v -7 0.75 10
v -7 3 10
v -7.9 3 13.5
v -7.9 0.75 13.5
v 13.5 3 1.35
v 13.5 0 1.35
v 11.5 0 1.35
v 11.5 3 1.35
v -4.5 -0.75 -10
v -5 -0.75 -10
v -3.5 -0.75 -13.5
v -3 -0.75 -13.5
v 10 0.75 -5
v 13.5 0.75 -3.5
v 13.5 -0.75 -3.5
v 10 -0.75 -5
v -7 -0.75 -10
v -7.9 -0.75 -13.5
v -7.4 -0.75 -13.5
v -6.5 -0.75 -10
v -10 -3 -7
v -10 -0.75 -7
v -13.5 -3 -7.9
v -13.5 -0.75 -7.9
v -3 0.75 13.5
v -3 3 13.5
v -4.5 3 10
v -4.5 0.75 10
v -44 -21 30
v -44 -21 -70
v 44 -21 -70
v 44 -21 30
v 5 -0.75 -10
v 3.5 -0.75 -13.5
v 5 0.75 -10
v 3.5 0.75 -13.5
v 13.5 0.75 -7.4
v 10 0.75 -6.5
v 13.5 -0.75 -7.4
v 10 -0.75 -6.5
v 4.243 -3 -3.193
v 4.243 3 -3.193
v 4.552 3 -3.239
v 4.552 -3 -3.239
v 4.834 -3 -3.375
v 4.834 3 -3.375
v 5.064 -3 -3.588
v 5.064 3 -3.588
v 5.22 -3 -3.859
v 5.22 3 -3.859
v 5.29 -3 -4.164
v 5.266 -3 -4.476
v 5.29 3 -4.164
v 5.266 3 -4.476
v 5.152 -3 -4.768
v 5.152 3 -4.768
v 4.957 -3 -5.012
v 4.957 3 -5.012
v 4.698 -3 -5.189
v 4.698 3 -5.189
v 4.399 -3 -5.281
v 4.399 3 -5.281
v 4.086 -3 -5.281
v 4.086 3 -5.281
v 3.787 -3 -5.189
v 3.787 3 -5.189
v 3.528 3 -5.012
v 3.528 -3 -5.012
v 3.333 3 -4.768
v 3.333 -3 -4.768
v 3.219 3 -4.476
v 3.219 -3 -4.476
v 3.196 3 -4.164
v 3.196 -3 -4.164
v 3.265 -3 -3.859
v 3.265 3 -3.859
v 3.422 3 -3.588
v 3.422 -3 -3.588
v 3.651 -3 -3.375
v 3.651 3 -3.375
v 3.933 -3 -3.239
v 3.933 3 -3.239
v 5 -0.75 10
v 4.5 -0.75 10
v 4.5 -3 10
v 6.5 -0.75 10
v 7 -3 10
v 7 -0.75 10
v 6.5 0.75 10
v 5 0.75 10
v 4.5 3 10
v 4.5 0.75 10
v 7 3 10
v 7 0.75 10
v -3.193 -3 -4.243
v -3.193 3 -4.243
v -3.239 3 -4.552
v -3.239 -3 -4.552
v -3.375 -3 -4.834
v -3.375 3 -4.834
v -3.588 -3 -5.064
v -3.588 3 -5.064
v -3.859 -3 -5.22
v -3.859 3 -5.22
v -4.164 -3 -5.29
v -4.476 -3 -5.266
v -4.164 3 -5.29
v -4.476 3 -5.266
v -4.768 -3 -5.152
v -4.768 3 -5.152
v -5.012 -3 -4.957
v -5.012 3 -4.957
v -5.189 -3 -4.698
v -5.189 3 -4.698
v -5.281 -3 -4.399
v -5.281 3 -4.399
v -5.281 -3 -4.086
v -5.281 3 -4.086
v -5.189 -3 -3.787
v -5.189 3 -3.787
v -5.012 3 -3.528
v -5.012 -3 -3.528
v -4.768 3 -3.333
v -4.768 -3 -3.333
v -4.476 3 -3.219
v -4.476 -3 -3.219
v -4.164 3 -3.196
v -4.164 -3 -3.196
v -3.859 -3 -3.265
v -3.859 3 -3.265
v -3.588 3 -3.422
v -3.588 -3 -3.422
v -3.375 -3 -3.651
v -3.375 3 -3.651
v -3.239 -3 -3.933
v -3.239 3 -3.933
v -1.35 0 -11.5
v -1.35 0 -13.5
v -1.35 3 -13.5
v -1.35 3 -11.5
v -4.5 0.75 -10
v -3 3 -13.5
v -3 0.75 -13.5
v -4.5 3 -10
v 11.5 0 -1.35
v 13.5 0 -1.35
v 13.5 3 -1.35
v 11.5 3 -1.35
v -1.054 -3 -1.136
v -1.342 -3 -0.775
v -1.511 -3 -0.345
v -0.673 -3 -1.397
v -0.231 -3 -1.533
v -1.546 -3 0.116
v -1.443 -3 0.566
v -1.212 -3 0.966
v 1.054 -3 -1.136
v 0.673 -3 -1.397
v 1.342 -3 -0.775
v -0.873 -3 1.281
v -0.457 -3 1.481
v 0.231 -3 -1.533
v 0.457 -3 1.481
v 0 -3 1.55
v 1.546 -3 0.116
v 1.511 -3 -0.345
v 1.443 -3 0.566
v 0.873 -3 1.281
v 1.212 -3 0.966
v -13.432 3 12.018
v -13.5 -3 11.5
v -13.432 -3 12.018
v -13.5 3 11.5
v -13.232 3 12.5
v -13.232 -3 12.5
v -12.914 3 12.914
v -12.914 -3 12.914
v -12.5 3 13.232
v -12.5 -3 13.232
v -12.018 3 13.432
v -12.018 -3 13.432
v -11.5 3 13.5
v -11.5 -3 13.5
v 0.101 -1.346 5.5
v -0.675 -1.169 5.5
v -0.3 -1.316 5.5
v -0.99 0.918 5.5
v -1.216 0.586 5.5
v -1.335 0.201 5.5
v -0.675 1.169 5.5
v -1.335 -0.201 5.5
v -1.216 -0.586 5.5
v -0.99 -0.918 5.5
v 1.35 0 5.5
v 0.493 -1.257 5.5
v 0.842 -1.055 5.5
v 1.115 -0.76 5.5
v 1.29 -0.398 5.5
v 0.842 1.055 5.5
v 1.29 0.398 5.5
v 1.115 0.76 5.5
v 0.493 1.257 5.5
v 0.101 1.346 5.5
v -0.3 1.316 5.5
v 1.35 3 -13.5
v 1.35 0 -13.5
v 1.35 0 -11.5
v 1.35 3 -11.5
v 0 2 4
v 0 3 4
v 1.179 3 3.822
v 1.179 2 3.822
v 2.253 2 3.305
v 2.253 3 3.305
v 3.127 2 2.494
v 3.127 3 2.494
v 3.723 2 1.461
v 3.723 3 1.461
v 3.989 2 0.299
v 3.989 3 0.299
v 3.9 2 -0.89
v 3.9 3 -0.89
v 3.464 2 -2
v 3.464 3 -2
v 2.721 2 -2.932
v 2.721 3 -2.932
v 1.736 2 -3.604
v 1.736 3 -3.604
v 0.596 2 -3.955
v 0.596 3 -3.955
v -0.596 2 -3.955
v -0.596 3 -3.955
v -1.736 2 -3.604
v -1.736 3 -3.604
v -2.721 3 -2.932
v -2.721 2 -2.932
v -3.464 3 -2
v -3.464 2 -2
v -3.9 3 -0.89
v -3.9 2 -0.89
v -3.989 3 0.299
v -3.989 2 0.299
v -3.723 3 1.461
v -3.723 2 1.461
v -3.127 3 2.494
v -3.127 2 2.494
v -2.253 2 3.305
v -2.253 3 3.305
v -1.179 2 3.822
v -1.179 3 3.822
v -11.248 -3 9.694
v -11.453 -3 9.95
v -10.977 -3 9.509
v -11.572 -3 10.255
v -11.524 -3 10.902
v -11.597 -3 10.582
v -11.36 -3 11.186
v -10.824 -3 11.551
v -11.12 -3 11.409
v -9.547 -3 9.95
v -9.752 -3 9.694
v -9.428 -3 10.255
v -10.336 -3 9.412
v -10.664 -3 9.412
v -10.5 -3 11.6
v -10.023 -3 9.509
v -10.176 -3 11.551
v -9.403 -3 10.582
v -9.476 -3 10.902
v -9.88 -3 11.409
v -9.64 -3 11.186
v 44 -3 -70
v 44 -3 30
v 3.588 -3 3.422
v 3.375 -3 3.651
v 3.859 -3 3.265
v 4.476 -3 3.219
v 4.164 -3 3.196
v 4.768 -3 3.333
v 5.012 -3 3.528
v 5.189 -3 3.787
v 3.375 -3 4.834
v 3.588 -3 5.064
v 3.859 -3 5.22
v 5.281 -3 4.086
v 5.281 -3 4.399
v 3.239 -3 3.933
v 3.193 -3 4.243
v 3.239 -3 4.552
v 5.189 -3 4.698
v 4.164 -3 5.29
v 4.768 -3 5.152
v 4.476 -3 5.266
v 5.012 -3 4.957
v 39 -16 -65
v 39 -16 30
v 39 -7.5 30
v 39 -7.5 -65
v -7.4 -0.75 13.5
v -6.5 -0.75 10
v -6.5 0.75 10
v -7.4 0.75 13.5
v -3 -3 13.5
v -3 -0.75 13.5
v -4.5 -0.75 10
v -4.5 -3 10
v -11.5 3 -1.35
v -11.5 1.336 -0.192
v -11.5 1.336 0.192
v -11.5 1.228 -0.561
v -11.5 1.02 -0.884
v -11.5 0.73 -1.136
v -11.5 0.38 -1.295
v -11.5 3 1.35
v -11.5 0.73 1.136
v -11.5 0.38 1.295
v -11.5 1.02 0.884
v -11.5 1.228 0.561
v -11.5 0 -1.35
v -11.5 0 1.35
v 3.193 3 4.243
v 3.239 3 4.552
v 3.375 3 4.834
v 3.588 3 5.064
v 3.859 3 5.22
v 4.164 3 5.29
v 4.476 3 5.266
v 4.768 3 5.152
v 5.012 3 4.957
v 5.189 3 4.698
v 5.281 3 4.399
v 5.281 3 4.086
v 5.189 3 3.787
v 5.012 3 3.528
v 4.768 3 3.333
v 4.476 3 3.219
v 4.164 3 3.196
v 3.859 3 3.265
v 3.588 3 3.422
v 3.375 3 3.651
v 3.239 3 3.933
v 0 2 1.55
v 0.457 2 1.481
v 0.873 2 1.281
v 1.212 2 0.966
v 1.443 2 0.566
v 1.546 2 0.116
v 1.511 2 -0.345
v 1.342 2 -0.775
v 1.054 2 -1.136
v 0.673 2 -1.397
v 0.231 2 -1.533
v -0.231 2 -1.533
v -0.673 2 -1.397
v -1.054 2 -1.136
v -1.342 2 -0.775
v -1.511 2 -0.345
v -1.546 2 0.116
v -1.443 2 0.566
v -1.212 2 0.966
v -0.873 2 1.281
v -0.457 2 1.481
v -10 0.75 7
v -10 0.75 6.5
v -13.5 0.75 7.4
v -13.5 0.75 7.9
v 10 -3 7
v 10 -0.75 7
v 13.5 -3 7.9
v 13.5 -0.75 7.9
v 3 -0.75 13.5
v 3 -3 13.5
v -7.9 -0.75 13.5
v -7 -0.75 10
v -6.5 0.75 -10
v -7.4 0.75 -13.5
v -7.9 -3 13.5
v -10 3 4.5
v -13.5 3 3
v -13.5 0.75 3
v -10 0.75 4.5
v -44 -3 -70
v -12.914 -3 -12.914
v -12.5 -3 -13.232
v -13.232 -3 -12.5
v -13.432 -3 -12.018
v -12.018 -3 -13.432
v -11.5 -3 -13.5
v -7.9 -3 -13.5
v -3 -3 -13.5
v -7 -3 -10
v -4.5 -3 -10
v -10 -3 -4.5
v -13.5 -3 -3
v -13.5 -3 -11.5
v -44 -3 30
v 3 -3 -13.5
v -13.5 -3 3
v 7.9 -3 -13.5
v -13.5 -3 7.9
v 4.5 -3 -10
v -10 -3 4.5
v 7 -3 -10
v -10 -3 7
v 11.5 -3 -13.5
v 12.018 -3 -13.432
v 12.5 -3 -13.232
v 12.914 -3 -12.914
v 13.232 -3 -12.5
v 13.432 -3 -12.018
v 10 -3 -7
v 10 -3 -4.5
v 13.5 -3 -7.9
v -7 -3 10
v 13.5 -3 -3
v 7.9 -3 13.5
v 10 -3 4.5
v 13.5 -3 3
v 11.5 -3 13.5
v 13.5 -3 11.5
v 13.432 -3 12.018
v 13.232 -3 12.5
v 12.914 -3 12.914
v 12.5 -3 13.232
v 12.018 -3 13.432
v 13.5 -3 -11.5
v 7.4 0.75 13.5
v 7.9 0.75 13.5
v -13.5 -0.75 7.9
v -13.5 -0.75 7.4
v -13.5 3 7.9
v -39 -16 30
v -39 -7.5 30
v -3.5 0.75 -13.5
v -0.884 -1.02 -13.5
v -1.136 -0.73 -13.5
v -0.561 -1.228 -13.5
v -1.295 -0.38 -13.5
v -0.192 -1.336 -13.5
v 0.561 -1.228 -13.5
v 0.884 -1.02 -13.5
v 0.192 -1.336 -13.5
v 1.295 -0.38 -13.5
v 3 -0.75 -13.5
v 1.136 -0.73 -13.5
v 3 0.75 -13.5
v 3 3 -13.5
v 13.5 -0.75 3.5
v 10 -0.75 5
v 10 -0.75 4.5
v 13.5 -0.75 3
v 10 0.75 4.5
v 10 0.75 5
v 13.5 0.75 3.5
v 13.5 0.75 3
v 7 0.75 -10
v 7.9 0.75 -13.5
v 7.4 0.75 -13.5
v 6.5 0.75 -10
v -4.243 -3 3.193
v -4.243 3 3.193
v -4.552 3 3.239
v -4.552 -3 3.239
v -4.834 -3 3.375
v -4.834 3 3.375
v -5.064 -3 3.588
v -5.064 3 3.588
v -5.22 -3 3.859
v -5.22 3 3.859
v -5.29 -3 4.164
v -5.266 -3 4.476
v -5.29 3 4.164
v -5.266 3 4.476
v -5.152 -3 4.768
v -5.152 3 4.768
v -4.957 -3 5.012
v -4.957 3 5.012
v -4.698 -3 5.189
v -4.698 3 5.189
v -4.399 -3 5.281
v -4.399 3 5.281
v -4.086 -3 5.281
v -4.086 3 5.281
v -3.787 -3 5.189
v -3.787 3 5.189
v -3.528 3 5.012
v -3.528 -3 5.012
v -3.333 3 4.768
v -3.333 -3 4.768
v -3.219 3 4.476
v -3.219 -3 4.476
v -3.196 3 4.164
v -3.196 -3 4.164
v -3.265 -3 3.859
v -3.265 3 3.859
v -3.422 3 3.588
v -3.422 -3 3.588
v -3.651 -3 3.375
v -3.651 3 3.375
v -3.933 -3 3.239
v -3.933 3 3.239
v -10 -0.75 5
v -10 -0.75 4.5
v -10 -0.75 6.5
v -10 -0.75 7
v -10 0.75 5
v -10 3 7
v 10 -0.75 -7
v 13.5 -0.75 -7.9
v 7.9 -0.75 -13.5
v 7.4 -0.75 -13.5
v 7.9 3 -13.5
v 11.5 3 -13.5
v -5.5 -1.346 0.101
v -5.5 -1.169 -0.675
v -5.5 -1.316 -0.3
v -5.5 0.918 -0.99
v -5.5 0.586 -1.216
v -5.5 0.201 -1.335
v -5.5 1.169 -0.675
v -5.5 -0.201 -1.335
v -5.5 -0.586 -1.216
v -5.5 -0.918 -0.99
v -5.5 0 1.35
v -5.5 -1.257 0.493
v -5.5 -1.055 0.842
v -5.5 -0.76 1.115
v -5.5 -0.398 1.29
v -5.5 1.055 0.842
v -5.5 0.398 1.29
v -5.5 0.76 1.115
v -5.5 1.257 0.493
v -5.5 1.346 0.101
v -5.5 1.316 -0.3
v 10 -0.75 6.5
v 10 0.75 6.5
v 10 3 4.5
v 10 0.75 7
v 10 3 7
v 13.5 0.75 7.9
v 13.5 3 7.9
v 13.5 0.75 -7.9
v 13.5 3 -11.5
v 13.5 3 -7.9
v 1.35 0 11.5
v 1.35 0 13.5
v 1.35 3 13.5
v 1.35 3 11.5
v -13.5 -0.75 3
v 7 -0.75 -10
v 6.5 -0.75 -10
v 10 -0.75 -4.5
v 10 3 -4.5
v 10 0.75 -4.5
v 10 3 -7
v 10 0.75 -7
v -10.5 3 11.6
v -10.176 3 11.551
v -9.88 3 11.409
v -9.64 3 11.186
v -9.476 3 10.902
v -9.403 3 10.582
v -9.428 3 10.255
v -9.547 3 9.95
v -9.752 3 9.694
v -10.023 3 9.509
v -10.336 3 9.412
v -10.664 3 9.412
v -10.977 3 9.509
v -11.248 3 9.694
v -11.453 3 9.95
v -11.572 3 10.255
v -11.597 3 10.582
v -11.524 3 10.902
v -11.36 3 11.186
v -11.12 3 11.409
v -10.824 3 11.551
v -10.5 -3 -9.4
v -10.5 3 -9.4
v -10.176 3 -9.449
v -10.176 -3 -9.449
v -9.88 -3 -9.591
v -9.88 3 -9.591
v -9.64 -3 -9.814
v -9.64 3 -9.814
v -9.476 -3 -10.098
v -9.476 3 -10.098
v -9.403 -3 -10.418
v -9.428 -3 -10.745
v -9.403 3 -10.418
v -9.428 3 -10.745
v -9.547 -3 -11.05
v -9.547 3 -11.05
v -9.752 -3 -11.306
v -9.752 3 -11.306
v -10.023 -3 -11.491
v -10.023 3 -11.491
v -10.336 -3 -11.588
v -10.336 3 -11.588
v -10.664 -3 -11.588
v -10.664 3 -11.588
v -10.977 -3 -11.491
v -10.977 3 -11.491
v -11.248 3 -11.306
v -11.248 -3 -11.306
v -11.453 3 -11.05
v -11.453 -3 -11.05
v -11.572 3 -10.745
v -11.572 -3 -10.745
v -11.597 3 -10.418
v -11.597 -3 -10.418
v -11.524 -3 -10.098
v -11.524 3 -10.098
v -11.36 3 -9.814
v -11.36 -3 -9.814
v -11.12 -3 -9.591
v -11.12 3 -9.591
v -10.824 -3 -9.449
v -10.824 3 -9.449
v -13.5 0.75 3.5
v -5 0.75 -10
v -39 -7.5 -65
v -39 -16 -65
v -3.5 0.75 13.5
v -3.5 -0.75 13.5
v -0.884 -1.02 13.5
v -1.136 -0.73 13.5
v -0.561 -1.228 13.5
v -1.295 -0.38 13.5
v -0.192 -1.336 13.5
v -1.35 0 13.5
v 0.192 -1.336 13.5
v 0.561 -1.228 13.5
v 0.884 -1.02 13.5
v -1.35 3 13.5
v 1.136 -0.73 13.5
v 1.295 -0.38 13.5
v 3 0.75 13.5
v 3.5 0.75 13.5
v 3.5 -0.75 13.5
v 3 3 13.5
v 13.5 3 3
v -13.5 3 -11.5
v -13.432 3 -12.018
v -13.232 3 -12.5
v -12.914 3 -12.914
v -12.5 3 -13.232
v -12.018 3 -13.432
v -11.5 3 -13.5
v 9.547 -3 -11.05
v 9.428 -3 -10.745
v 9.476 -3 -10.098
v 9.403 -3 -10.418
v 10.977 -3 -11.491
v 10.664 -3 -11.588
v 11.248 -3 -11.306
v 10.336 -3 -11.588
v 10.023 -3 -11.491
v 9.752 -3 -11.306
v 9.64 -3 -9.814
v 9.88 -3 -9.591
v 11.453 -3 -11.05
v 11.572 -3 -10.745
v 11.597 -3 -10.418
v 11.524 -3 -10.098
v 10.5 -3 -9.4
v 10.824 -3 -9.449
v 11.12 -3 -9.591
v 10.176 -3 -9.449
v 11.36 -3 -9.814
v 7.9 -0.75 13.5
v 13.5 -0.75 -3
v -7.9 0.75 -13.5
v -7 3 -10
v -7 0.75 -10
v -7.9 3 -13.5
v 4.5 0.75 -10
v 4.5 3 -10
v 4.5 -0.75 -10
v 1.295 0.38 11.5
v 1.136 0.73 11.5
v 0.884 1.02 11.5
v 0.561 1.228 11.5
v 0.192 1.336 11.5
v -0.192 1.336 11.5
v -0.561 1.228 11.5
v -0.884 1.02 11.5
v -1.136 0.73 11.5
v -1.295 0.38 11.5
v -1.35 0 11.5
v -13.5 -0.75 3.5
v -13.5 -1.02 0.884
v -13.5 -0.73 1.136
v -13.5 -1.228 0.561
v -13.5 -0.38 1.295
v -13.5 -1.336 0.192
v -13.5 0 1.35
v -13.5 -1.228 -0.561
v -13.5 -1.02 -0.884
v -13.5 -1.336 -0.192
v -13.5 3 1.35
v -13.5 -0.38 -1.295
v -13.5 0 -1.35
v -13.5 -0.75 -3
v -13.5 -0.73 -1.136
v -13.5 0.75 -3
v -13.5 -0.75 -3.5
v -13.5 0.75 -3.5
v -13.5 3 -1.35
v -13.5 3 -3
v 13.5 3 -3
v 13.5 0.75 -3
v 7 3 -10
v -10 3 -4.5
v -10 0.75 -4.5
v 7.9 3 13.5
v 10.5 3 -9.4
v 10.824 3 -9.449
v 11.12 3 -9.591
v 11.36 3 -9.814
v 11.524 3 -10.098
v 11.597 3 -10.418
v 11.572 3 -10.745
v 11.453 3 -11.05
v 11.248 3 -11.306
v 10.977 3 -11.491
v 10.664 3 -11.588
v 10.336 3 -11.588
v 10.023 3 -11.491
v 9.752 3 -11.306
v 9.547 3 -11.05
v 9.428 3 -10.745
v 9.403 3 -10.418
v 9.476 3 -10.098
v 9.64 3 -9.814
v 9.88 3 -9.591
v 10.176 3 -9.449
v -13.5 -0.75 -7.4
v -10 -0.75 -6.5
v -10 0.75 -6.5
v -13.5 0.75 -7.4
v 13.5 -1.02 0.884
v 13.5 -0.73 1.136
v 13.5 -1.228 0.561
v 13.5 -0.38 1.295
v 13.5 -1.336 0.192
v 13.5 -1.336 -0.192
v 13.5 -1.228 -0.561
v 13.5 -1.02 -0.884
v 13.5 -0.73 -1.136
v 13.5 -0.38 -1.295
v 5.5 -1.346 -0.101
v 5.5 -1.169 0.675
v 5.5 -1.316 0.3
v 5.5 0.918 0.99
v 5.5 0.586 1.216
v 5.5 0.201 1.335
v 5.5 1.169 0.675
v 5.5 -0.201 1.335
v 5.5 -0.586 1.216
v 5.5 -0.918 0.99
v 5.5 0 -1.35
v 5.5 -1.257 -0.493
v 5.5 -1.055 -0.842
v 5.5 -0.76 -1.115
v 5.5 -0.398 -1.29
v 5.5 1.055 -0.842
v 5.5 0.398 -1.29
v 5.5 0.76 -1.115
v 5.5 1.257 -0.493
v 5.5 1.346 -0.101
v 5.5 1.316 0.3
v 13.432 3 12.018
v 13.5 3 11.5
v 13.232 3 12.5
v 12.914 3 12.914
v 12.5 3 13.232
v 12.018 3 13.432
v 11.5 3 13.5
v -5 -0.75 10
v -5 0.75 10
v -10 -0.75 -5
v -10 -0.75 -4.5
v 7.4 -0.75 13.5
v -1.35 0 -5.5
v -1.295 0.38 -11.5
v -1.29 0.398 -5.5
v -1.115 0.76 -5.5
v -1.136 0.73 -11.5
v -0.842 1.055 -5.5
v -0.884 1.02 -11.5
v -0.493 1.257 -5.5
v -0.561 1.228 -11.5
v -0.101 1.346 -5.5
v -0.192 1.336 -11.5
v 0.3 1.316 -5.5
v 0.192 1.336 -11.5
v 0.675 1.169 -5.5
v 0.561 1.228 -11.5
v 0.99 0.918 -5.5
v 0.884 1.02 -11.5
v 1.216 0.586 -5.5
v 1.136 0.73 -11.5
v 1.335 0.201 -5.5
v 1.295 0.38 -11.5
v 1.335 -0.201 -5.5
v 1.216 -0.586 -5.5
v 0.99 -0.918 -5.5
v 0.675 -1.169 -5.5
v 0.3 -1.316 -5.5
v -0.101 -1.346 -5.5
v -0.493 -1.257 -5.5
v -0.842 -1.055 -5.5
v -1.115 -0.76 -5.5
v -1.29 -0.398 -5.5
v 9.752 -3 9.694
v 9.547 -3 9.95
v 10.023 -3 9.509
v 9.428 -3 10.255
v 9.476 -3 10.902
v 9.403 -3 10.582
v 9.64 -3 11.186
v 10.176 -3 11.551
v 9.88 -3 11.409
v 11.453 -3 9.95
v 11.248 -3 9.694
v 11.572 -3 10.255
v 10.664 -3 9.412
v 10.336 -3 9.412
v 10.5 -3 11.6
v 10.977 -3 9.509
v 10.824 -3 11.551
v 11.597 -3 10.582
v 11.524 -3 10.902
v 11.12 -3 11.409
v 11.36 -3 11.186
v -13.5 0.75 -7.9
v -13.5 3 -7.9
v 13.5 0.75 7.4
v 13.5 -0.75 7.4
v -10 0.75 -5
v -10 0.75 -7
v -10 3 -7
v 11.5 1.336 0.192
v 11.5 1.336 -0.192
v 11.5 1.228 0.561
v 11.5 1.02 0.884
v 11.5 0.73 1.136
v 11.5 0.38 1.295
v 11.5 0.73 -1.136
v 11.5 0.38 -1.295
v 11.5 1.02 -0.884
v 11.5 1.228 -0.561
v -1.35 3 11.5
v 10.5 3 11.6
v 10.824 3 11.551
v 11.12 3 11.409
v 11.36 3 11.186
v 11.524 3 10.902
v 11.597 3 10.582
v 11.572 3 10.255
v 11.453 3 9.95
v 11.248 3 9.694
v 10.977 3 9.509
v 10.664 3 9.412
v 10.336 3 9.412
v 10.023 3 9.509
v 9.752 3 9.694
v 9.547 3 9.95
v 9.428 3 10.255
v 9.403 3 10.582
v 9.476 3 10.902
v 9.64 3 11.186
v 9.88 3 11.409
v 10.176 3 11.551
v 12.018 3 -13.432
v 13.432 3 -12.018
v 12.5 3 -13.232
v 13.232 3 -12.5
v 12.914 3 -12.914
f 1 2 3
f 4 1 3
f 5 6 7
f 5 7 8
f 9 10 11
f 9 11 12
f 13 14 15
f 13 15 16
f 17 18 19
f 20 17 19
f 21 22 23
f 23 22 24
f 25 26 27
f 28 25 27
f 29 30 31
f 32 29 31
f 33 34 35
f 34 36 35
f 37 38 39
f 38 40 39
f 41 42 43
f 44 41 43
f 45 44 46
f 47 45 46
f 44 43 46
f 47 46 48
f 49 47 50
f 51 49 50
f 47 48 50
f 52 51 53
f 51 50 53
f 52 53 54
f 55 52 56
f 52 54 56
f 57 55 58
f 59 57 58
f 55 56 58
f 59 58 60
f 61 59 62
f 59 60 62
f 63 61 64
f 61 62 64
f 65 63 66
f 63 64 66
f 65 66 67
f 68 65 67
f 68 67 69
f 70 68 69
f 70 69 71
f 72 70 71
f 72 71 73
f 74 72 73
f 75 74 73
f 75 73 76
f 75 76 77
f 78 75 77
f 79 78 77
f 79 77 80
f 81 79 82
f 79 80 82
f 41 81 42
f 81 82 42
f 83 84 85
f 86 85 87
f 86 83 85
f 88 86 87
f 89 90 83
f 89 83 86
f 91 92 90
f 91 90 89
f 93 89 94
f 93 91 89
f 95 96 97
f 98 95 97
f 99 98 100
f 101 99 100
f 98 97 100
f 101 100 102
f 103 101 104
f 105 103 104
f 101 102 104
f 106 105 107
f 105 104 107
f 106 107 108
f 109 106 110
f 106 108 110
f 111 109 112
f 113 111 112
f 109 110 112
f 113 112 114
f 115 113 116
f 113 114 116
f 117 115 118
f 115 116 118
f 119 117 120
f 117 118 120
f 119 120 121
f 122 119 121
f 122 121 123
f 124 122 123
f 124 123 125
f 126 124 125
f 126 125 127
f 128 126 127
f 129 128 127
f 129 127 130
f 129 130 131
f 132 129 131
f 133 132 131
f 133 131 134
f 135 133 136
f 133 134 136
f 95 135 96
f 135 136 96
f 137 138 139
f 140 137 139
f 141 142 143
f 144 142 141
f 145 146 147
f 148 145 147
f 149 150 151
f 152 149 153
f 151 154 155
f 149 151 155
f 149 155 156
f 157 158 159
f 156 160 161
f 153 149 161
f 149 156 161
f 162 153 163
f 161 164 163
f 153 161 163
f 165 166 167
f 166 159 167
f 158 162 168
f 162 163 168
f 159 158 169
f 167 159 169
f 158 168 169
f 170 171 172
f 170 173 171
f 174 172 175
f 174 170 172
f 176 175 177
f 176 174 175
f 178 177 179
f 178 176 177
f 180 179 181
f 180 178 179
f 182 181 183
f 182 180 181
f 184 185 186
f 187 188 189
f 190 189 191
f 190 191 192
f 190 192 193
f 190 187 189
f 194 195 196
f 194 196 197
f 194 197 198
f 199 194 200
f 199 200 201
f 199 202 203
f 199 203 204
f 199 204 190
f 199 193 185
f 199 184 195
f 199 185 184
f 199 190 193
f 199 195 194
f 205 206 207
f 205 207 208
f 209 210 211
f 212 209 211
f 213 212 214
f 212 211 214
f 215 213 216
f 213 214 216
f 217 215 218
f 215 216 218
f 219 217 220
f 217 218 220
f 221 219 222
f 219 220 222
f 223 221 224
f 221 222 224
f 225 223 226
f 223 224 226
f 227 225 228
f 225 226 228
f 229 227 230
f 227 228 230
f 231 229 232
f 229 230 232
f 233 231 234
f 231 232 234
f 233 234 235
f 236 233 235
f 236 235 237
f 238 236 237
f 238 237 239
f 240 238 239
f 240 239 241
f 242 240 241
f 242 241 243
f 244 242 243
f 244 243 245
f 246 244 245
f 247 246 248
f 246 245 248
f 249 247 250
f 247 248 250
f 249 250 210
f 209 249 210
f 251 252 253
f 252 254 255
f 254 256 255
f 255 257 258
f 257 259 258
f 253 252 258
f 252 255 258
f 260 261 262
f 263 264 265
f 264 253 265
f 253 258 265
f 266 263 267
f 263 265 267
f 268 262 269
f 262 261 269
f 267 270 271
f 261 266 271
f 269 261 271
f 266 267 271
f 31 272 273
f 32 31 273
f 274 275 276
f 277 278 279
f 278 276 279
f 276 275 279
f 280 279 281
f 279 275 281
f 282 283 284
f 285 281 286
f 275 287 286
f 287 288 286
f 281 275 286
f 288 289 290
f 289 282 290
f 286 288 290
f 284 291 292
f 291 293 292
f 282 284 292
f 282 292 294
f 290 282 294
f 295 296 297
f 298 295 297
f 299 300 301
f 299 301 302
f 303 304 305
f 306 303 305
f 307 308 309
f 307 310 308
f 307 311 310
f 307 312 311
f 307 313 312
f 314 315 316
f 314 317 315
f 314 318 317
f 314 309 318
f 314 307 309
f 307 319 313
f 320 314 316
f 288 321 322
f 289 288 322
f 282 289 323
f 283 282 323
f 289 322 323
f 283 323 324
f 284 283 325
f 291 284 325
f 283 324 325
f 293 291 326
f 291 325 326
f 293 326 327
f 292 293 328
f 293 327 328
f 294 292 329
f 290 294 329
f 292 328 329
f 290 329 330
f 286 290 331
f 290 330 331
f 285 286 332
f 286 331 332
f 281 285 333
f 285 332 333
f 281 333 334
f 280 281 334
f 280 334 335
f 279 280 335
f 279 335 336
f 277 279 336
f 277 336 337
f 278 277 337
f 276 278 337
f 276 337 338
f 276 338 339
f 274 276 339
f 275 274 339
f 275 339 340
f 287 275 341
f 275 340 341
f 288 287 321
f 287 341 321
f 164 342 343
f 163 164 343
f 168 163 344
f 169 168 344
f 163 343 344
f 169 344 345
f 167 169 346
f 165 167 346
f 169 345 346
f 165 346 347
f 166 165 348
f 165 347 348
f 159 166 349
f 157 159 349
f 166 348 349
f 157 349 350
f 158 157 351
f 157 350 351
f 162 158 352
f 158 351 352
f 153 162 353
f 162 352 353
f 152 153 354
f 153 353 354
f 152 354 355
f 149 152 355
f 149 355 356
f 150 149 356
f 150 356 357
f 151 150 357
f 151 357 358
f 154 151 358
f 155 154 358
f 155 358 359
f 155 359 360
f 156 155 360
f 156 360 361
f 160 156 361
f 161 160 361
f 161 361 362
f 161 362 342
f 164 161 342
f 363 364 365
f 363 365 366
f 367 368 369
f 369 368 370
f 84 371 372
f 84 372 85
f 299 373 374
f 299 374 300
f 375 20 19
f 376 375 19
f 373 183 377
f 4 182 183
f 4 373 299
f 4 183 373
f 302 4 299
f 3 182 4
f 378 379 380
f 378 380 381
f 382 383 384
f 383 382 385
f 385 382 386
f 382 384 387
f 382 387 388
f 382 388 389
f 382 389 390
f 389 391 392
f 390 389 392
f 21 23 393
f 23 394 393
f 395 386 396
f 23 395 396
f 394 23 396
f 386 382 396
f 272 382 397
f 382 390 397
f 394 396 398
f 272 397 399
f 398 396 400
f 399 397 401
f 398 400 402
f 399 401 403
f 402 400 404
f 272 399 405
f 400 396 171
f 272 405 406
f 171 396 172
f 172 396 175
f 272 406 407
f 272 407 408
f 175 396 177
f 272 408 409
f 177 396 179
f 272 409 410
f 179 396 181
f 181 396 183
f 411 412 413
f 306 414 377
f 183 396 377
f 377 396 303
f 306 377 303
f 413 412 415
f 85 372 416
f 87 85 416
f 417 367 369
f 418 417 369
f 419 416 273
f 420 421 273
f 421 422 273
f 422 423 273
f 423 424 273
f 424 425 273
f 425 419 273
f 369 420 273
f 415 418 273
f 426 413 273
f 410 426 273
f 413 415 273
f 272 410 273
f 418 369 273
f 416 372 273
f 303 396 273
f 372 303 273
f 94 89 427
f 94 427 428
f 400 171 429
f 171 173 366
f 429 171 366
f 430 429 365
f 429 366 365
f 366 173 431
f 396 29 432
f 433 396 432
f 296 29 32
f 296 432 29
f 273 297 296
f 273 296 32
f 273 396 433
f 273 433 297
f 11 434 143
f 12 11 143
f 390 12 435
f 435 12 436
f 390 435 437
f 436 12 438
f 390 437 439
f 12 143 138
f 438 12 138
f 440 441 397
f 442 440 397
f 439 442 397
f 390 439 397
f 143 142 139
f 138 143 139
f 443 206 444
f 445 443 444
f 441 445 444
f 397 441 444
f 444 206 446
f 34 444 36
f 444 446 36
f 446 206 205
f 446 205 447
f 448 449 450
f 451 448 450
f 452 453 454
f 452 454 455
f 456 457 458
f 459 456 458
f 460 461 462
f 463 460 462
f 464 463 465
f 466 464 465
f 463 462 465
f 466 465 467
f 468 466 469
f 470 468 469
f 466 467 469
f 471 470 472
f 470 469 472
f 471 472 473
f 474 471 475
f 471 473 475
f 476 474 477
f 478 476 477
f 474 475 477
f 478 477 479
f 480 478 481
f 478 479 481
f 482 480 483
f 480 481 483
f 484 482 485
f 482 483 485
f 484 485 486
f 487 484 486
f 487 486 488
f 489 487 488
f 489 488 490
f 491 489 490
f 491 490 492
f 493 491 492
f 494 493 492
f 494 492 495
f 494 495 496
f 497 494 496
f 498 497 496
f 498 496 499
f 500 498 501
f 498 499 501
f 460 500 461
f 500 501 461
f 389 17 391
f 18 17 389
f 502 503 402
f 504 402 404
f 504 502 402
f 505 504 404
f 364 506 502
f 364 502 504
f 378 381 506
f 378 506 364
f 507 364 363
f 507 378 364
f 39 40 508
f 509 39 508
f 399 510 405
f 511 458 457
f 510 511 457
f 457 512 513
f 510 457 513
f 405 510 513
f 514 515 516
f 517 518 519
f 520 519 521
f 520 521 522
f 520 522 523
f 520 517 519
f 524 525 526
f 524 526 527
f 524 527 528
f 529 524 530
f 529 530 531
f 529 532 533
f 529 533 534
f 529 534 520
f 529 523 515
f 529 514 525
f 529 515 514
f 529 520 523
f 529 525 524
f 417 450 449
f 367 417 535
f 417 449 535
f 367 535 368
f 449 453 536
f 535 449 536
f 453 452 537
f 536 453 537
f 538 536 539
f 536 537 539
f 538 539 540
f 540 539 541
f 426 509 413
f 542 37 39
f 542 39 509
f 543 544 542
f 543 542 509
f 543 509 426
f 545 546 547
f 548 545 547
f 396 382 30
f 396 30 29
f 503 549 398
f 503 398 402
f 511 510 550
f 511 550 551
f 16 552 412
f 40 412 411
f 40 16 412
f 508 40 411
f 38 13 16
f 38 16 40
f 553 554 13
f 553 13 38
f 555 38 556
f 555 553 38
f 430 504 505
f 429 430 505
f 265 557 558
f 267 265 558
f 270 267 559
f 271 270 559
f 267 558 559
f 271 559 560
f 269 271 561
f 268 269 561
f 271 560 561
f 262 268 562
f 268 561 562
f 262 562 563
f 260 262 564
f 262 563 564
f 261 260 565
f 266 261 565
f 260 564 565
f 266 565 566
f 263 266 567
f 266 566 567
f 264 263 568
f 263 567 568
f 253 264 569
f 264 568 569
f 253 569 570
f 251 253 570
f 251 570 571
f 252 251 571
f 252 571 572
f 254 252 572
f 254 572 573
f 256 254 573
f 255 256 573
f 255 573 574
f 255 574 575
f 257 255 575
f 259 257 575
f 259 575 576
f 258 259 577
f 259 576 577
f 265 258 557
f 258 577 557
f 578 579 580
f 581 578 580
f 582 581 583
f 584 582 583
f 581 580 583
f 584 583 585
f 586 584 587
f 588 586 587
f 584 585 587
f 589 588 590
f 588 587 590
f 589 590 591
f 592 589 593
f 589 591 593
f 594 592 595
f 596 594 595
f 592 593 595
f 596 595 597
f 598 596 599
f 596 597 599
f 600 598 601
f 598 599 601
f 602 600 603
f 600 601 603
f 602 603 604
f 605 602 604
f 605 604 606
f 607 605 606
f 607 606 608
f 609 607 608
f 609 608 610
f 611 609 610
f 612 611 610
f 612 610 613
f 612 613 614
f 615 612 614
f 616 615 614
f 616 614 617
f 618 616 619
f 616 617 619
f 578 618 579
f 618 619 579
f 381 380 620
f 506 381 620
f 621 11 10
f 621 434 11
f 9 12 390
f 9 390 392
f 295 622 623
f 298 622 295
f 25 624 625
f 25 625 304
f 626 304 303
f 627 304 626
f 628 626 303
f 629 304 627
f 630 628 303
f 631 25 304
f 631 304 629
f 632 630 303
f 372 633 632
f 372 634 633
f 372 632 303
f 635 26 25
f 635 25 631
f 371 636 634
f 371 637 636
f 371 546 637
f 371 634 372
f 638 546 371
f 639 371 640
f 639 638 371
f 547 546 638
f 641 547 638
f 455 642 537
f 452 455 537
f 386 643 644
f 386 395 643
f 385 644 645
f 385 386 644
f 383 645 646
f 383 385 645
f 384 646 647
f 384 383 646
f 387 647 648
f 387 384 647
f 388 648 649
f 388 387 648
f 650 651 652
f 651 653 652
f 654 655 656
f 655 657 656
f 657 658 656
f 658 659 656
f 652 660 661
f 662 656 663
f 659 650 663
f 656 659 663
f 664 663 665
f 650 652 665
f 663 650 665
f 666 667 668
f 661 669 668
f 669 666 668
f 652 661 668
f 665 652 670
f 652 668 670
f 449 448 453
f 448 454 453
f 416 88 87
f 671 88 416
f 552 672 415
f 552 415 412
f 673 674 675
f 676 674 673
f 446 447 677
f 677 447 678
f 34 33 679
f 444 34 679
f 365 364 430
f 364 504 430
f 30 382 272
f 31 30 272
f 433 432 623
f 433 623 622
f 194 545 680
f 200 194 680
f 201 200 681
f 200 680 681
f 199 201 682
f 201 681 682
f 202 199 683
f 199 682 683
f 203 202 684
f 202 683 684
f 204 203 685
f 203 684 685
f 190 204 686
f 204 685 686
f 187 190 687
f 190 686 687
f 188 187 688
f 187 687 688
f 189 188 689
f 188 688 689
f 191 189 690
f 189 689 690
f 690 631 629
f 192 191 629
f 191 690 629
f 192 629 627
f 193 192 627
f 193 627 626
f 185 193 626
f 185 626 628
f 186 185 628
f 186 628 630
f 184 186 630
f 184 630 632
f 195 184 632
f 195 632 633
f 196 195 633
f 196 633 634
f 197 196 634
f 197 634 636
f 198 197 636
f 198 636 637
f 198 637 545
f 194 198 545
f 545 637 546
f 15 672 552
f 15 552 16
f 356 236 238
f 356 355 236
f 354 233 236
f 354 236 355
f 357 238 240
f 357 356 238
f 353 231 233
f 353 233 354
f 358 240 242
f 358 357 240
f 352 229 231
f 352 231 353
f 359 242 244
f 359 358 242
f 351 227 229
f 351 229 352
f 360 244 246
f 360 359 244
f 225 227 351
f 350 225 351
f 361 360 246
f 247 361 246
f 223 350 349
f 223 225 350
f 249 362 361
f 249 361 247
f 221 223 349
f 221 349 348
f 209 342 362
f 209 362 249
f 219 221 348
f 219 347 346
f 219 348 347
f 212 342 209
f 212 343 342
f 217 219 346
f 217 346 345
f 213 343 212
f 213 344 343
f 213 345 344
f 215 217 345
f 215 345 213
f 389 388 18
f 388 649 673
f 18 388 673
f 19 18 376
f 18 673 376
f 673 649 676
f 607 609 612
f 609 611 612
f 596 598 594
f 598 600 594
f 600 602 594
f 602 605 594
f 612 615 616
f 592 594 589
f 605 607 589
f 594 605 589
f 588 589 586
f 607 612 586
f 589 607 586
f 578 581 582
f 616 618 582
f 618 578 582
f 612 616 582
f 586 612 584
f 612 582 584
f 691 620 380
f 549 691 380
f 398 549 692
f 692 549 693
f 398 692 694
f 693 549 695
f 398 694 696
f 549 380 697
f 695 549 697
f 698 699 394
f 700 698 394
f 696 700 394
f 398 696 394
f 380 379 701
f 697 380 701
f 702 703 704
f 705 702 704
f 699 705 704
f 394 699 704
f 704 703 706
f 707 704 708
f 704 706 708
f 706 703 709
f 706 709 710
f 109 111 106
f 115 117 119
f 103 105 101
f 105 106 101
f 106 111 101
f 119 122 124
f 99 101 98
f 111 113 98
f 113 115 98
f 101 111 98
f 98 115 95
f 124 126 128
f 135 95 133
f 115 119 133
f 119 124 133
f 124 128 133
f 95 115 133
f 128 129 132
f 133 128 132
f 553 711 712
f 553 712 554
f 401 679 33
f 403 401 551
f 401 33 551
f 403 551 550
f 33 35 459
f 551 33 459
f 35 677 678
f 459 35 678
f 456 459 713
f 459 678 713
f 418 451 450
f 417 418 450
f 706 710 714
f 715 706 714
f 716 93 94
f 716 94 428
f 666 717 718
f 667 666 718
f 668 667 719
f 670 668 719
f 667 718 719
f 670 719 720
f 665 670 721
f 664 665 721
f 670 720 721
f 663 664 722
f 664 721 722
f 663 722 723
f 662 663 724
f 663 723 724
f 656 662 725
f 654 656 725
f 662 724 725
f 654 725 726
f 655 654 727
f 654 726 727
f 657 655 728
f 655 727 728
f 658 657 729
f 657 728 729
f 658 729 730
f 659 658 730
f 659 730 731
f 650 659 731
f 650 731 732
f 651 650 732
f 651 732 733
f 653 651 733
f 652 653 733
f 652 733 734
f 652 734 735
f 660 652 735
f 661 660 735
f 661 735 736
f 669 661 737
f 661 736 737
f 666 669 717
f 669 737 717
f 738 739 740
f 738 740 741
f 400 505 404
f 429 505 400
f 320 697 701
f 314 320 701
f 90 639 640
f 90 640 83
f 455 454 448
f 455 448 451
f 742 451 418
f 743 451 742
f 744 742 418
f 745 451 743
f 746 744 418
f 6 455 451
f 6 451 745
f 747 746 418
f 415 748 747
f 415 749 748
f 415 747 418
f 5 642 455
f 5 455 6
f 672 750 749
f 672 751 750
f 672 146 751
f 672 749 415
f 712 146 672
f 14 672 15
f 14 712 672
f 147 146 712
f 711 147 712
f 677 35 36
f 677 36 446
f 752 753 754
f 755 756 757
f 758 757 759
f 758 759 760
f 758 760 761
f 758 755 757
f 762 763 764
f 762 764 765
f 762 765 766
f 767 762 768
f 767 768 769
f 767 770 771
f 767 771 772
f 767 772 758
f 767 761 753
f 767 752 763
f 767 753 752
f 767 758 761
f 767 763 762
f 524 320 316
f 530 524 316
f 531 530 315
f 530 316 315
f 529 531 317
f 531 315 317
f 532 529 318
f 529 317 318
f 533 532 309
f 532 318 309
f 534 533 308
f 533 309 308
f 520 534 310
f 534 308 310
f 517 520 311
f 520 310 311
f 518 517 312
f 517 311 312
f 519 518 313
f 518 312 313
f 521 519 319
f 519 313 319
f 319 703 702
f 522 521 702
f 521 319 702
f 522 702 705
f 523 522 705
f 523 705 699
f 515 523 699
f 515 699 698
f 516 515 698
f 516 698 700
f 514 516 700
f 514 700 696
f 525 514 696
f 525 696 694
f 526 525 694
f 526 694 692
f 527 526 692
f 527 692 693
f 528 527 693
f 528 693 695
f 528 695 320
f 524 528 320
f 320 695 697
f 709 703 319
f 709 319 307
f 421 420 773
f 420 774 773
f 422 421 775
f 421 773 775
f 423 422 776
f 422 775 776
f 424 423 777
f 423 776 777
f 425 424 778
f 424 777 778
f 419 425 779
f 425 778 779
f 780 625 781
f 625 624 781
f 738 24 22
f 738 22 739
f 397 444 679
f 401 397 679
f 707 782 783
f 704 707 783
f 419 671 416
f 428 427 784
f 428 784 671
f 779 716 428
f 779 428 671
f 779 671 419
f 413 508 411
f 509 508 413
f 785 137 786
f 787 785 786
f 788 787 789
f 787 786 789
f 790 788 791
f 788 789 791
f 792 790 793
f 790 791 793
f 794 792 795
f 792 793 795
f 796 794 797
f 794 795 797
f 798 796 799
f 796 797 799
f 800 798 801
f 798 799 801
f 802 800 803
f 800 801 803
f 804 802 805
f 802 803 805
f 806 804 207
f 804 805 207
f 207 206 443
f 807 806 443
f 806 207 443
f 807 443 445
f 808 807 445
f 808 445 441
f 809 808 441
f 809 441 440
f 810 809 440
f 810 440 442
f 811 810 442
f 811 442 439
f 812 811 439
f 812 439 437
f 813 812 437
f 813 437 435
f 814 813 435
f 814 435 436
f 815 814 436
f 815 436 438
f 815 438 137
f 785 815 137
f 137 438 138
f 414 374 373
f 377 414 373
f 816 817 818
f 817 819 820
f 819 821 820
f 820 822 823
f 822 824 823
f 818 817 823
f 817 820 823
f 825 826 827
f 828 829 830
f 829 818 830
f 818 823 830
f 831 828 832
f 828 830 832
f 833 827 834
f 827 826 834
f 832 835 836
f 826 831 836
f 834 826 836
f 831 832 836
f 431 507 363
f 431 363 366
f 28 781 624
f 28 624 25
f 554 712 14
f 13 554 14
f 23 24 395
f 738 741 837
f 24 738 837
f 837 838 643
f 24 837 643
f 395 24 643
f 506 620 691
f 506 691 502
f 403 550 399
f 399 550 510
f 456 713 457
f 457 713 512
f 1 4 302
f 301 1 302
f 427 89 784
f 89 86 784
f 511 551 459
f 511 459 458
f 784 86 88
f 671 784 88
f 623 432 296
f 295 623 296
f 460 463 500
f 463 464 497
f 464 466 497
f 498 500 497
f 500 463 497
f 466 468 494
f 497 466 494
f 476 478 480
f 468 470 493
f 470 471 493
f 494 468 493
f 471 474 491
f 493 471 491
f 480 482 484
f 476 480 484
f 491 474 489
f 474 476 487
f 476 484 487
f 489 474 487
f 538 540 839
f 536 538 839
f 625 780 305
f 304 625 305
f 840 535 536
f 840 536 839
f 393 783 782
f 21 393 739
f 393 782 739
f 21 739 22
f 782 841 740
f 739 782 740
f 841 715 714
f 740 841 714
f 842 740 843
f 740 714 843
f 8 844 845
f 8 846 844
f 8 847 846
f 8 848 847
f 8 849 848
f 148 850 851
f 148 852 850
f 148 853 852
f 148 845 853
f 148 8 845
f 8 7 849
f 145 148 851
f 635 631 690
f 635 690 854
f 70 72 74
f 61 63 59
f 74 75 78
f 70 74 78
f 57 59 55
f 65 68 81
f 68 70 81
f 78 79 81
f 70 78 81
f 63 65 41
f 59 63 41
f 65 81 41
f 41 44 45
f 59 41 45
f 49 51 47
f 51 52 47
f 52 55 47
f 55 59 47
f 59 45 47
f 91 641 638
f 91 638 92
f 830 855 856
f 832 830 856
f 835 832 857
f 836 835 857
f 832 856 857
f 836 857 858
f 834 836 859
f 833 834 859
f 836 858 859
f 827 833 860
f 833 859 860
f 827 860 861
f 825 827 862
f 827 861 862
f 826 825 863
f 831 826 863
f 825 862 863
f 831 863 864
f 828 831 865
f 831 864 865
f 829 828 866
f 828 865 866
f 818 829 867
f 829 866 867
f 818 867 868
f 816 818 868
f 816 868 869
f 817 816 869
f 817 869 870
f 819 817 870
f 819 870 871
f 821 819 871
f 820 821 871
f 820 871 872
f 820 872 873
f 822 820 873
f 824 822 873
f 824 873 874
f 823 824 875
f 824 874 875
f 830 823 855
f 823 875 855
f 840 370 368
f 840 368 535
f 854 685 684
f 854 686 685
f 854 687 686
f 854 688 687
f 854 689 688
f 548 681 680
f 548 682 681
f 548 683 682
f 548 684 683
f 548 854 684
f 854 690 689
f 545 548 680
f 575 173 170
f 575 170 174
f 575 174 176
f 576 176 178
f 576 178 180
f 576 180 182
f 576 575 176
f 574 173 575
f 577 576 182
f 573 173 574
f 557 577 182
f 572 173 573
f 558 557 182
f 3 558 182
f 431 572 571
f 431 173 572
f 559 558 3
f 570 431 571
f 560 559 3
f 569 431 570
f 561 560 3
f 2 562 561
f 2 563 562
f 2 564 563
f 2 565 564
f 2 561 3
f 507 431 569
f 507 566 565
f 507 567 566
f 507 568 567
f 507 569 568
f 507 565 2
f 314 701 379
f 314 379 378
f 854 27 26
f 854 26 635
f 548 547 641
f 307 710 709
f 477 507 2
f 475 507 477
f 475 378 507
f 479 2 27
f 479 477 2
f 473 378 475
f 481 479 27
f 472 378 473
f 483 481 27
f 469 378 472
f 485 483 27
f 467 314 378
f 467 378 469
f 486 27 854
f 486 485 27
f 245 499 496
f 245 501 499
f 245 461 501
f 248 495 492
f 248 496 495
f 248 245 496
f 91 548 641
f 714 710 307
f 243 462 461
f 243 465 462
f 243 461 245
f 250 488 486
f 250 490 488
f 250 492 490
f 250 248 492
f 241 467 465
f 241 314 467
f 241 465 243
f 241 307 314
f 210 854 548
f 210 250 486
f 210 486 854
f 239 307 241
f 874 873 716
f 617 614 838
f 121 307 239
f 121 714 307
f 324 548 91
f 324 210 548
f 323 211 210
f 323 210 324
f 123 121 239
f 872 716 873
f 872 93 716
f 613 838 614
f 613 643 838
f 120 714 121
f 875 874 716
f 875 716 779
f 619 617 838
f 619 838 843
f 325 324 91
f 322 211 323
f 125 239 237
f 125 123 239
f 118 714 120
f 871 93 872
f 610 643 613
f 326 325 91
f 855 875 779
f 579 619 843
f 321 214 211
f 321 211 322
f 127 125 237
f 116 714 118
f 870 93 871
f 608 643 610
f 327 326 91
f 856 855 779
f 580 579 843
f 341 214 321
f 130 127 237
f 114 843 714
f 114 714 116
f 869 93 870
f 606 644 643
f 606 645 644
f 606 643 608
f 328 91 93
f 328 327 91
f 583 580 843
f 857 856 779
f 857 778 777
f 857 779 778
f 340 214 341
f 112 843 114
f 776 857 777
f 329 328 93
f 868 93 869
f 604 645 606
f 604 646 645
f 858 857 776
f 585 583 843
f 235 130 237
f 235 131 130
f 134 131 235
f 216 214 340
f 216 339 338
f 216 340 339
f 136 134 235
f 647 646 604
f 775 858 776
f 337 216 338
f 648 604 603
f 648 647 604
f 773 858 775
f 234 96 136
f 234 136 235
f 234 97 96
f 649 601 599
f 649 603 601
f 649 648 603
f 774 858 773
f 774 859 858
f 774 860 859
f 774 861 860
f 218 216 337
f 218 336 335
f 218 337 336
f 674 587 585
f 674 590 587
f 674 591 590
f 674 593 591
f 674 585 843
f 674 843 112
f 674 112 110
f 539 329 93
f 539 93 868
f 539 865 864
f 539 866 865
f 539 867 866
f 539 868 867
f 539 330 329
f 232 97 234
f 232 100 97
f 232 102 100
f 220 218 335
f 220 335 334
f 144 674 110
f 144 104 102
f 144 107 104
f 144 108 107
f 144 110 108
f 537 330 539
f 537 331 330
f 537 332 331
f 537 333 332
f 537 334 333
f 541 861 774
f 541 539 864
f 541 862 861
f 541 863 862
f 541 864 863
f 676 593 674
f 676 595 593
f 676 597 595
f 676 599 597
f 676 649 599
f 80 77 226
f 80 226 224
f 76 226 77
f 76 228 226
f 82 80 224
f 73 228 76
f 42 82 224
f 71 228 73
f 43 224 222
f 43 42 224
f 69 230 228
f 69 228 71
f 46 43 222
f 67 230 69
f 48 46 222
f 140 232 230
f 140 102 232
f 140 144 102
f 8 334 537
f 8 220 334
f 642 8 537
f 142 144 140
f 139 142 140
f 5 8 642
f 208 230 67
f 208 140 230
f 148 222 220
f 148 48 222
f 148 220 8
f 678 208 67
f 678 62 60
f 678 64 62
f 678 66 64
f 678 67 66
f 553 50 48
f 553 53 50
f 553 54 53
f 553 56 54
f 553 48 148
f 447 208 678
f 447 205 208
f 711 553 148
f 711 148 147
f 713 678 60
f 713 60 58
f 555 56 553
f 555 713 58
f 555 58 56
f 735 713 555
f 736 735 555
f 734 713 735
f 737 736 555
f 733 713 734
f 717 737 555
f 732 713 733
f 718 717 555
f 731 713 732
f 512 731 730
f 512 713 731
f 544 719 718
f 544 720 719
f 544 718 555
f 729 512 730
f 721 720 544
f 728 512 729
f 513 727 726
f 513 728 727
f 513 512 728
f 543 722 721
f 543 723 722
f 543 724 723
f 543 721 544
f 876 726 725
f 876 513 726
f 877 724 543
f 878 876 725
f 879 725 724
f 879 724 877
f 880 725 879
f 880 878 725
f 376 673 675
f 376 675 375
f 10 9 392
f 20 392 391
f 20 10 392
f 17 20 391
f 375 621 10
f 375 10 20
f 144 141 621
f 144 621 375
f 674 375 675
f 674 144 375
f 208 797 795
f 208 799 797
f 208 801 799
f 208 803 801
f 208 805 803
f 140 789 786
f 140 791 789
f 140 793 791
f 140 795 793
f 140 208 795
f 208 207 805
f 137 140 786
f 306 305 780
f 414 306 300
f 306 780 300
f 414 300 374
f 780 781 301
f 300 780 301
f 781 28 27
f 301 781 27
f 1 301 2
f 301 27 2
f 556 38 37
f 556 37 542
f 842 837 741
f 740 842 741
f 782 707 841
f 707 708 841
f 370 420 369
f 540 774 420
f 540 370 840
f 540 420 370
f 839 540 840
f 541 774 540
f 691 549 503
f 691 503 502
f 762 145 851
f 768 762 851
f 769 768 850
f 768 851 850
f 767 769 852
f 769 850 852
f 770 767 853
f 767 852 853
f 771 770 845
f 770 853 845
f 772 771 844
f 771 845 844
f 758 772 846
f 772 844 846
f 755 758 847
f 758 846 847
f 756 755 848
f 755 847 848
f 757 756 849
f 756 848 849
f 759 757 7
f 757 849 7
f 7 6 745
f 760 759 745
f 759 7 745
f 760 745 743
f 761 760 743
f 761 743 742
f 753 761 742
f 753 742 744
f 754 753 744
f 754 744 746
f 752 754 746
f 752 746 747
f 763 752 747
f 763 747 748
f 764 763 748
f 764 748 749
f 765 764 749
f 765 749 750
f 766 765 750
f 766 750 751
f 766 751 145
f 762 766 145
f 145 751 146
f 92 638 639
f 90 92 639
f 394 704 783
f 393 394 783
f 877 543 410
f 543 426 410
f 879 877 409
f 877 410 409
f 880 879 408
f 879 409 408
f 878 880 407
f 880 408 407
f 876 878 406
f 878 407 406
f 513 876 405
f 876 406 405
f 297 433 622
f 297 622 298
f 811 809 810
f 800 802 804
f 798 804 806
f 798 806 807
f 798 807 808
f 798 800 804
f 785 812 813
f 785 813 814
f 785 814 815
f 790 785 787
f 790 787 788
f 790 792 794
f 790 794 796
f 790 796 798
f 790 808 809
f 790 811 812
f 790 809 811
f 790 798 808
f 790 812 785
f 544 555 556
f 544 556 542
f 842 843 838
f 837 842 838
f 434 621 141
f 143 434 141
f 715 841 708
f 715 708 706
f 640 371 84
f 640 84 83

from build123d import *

# Parameters (mm, degrees)
SKETCH_3_W                      = 27
SKETCH_3_H                      = 27
EXTRUDE_1_DEPTH                 = 3
FILLET_1_R                      = 2
SKETCH_4_R                      = 1.1
CUT_EXTRUDE_1_DEPTH             = 6
SKETCH_5_R                      = 1.55
CUT_EXTRUDE_2_DEPTH             = 6
SKETCH_6_R                      = 1.05
CUT_EXTRUDE_3_DEPTH             = 6
PATTERN_CIRCULAR_1_COUNT        = 4
SKETCH_7_R                      = 4
CUT_EXTRUDE_4_DEPTH             = 1
CUT_EXTRUDE_8_DEPTH             = 21.012496096
PATTERN_CIRCULAR_2_COUNT        = 4
PATTERN_CIRCULAR_2_COPY_1_DEPTH = 21.012496096
PATTERN_CIRCULAR_2_COPY_2_DEPTH = 21.012496096
PATTERN_CIRCULAR_2_COPY_3_DEPTH = 21.012496096
SKETCH_12_R                     = 1.35
CUT_EXTRUDE_9_DEPTH             = 8
PATTERN_CIRCULAR_3_COUNT        = 4
EXTRUDE_2_DEPTH                 = 0.75
PATTERN_CIRCULAR_4_COUNT        = 4
PATTERN_CIRCULAR_4_COPY_1_DEPTH = 0.75
PATTERN_CIRCULAR_4_COPY_2_DEPTH = 0.75
PATTERN_CIRCULAR_4_COPY_3_DEPTH = 0.75
SKETCH_22_W                     = 2.7
SKETCH_22_H                     = 3
CUT_EXTRUDE_15_DEPTH            = 2
PATTERN_CIRCULAR_11_COUNT       = 4
SKETCH_31_W                     = 88
SKETCH_31_H                     = 100
EXTRUDE_4_DEPTH                 = 18
SKETCH_32_W                     = 78
SKETCH_32_H                     = 8.5
CUT_EXTRUDE_17_DEPTH            = 95


with BuildPart() as part:
    # ｽｹｯﾁ3 → ﾎﾞｽ - 押し出し1 (new, symmetric)
    with BuildSketch(Plane(origin=(0, 0, 0), x_dir=(1, 0, 0), z_dir=(0, 1, 0))):
        Rectangle(SKETCH_3_W, SKETCH_3_H)
    extrude(amount=EXTRUDE_1_DEPTH, both=True)

    # ﾌｨﾚｯﾄ1
    fillet_1_edges = [part.edges().sort_by_distance(p)[0] for p in [
        (13.5, 0, 13.5),
        (-13.5, 0, 13.5),
        (-13.5, 0, -13.5),
        (13.5, 0, -13.5),
    ]]
    fillet(fillet_1_edges, radius=FILLET_1_R)

    # ｽｹｯﾁ4 → ｶｯﾄ - 押し出し1 (cut)
    with BuildSketch(Plane(origin=(0, 3, 0), x_dir=(1, 0, 0), z_dir=(0, 1, 0))):
        with Locations(Location((-10.5, 10.5, 0), (0, 0, 270))):
            Circle(SKETCH_4_R)
        with Locations(Location((10.5, 10.5, 0), (0, 0, 270))):
            Circle(SKETCH_4_R)
        with Locations(Location((-10.5, -10.5, 0), (0, 0, 270))):
            Circle(SKETCH_4_R)
        with Locations(Location((10.5, -10.5, 0), (0, 0, 270))):
            Circle(SKETCH_4_R)
    extrude(amount=-CUT_EXTRUDE_1_DEPTH, mode=Mode.SUBTRACT)

    # ｽｹｯﾁ5 → ｶｯﾄ - 押し出し2 (cut)
    with BuildSketch(Plane(origin=(0, 3, 0), x_dir=(1, 0, 0), z_dir=(0, 1, 0))):
        with Locations(Location((0, 0, 0), (0, 0, 270))):
            Circle(SKETCH_5_R)
    extrude(amount=-CUT_EXTRUDE_2_DEPTH, mode=Mode.SUBTRACT)

    # ｽｹｯﾁ6 → ｶｯﾄ - 押し出し3 (cut)
    with BuildSketch(Plane(origin=(0, 3, 0), x_dir=(1, 0, 0), z_dir=(0, 1, 0))):
        with Locations(Location((4.242640687, 4.242640687, 0), (0, 0, 270))):
            Circle(SKETCH_6_R)
    cut_extrude_3 = extrude(amount=-CUT_EXTRUDE_3_DEPTH, mode=Mode.SUBTRACT)

    # 円形ﾊﾟﾀｰﾝ1: ｶｯﾄ - 押し出し3 ×4 about axis
    pattern_circular_1_axis = Axis((0, 0, 0), (0, 1, 0))
    for i in range(1, PATTERN_CIRCULAR_1_COUNT):
        add(cut_extrude_3.rotate(pattern_circular_1_axis, i * 360 / PATTERN_CIRCULAR_1_COUNT), mode=Mode.SUBTRACT)

    # ｽｹｯﾁ7 → ｶｯﾄ - 押し出し4 (cut)
    with BuildSketch(Plane(origin=(0, 3, 0), x_dir=(1, 0, 0), z_dir=(0, 1, 0))):
        with Locations(Location((0, 0, 0), (0, 0, 270))):
            Circle(SKETCH_7_R)
    extrude(amount=-CUT_EXTRUDE_4_DEPTH, mode=Mode.SUBTRACT)

    # ｽｹｯﾁ11 → ｶｯﾄ - 押し出し8 (cut, symmetric)
    with BuildSketch(Plane(origin=(0, 3, 0), x_dir=(1, 0, 0), z_dir=(0, 1, 0))):
        Polygon((-28.082033535, 86.024744916), (3, 13.5), (4.5, 10), (7, 10), (7.9, 13.5), (27.55047658, 89.918520033), (16.532211377, 247.342544779), (-39.100298738, 243.448769662), align=None)
    cut_extrude_8 = extrude(amount=CUT_EXTRUDE_8_DEPTH, both=True, mode=Mode.SUBTRACT)

    # ﾐﾗｰ1: ｶｯﾄ - 押し出し8 across plane
    add(cut_extrude_8.mirror(Plane(origin=(0, 0, 0), x_dir=(0, 0, 1), z_dir=(1, 0, 0))), mode=Mode.SUBTRACT)

    # 円形ﾊﾟﾀｰﾝ2: ｶｯﾄ - 押し出し8 ×4 about axis
    pattern_circular_2_axis = Axis((0, 0, 0), (0, 1, 0))
    for i in range(1, PATTERN_CIRCULAR_2_COUNT):
        add(cut_extrude_8.rotate(pattern_circular_2_axis, i * 360 / PATTERN_CIRCULAR_2_COUNT), mode=Mode.SUBTRACT)

    # 円形ﾊﾟﾀｰﾝ2 copy 1 sketch → 円形ﾊﾟﾀｰﾝ2 copy 1 (cut, symmetric)
    with BuildSketch(Plane.ZX.offset(3)):
        Polygon((-28.082033535, -86.024744916), (3, -13.5), (4.5, -10), (7, -10), (7.9, -13.5), (27.55047658, -89.918520033), (16.532211377, -247.342544779), (-39.100298738, -243.448769662), align=None)
    extrude(amount=PATTERN_CIRCULAR_2_COPY_1_DEPTH, both=True, mode=Mode.SUBTRACT)

    # 円形ﾊﾟﾀｰﾝ2 copy 2 sketch → 円形ﾊﾟﾀｰﾝ2 copy 2 (cut, symmetric)
    with BuildSketch(Plane(origin=(0, 3, 0), x_dir=(1, 0, 0), z_dir=(0, 1, 0))):
        Polygon((-28.082033535, -86.024744916), (3, -13.5), (4.5, -10), (7, -10), (7.9, -13.5), (27.55047658, -89.918520033), (16.532211377, -247.342544779), (-39.100298738, -243.448769662), align=None)
    extrude(amount=PATTERN_CIRCULAR_2_COPY_2_DEPTH, both=True, mode=Mode.SUBTRACT)

    # 円形ﾊﾟﾀｰﾝ2 copy 3 sketch → 円形ﾊﾟﾀｰﾝ2 copy 3 (cut, symmetric)
    with BuildSketch(Plane(origin=(0, 3, 0), x_dir=(0, 0, -1), z_dir=(0, 1, 0))):
        Polygon((-28.082033535, -86.024744916), (3, -13.5), (4.5, -10), (7, -10), (7.9, -13.5), (27.55047658, -89.918520033), (16.532211377, -247.342544779), (-39.100298738, -243.448769662), align=None)
    extrude(amount=PATTERN_CIRCULAR_2_COPY_3_DEPTH, both=True, mode=Mode.SUBTRACT)

    # ｽｹｯﾁ12 → ｶｯﾄ - 押し出し9 (cut)
    with BuildSketch(Plane.XY.offset(13.5)):
        Circle(SKETCH_12_R)
    cut_extrude_9 = extrude(amount=-CUT_EXTRUDE_9_DEPTH, mode=Mode.SUBTRACT)

    # 円形ﾊﾟﾀｰﾝ3: ｶｯﾄ - 押し出し9 ×4 about axis
    pattern_circular_3_axis = Axis((0, 0, 0), (0, 1, 0))
    for i in range(1, PATTERN_CIRCULAR_3_COUNT):
        add(cut_extrude_9.rotate(pattern_circular_3_axis, i * 360 / PATTERN_CIRCULAR_3_COUNT), mode=Mode.SUBTRACT)

    # ｽｹｯﾁ13 → ﾎﾞｽ - 押し出し2 (add, symmetric)
    with BuildSketch(Plane(origin=(0, 0, 0), x_dir=(1, 0, 0), z_dir=(0, 1, 0))):
        Polygon((7.9, 13.5), (7, 10), (6.5, 10), (7.4, 13.5), align=None)
        Polygon((3, 13.5), (3.5, 13.5), (5, 10), (4.5, 10), align=None)
    extrude_2 = extrude(amount=EXTRUDE_2_DEPTH, both=True)

    # ﾐﾗｰ2: ﾎﾞｽ - 押し出し2 across plane
    add(extrude_2.mirror(Plane(origin=(0, 0, 0), x_dir=(0, 0, 1), z_dir=(1, 0, 0))))

    # 円形ﾊﾟﾀｰﾝ4: ﾎﾞｽ - 押し出し2 ×4 about axis
    pattern_circular_4_axis = Axis((0, 0, 0), (0, 1, 0))
    for i in range(1, PATTERN_CIRCULAR_4_COUNT):
        add(extrude_2.rotate(pattern_circular_4_axis, i * 360 / PATTERN_CIRCULAR_4_COUNT))

    # 円形ﾊﾟﾀｰﾝ4 copy 1 sketch → 円形ﾊﾟﾀｰﾝ4 copy 1 (add, symmetric)
    with BuildSketch(Plane.ZX):
        Polygon((7.9, -13.5), (7, -10), (6.5, -10), (7.4, -13.5), align=None)
        Polygon((3, -13.5), (3.5, -13.5), (5, -10), (4.5, -10), align=None)
    extrude(amount=PATTERN_CIRCULAR_4_COPY_1_DEPTH, both=True)

    # 円形ﾊﾟﾀｰﾝ4 copy 2 sketch → 円形ﾊﾟﾀｰﾝ4 copy 2 (add, symmetric)
    with BuildSketch(Plane(origin=(0, 0, 0), x_dir=(1, 0, 0), z_dir=(0, 1, 0))):
        Polygon((7.9, -13.5), (7, -10), (6.5, -10), (7.4, -13.5), align=None)
        Polygon((3, -13.5), (3.5, -13.5), (5, -10), (4.5, -10), align=None)
    extrude(amount=PATTERN_CIRCULAR_4_COPY_2_DEPTH, both=True)

    # 円形ﾊﾟﾀｰﾝ4 copy 3 sketch → 円形ﾊﾟﾀｰﾝ4 copy 3 (add, symmetric)
    with BuildSketch(Plane(origin=(0, 0, 0), x_dir=(0, 0, -1), z_dir=(0, 1, 0))):
        Polygon((7.9, -13.5), (7, -10), (6.5, -10), (7.4, -13.5), align=None)
        Polygon((3, -13.5), (3.5, -13.5), (5, -10), (4.5, -10), align=None)
    extrude(amount=PATTERN_CIRCULAR_4_COPY_3_DEPTH, both=True)

    # ｽｹｯﾁ22 → ｶｯﾄ - 押し出し15 (cut)
    with BuildSketch(Plane.XY.offset(13.5)):
        with Locations((0, 1.5)):
            Rectangle(SKETCH_22_W, SKETCH_22_H)
    cut_extrude_15 = extrude(amount=-CUT_EXTRUDE_15_DEPTH, mode=Mode.SUBTRACT)

    # 円形ﾊﾟﾀｰﾝ11: ｶｯﾄ - 押し出し15 ×4 about axis
    pattern_circular_11_axis = Axis((0, 0, 0), (0, 1, 0))
    for i in range(1, PATTERN_CIRCULAR_11_COUNT):
        add(cut_extrude_15.rotate(pattern_circular_11_axis, i * 360 / PATTERN_CIRCULAR_11_COUNT), mode=Mode.SUBTRACT)

    # ｽｹｯﾁ31 → ﾎﾞｽ - 押し出し4 (add)
    with BuildSketch(Plane.XZ.offset(3)):
        with Locations((0, -20)):
            Rectangle(SKETCH_31_W, SKETCH_31_H)
    extrude(amount=EXTRUDE_4_DEPTH)

    # ｽｹｯﾁ32 → ｶｯﾄ - 押し出し17 (cut)
    with BuildSketch(Plane.XY.offset(30)):
        with Locations((0, -11.75)):
            Rectangle(SKETCH_32_W, SKETCH_32_H)
    extrude(amount=-CUT_EXTRUDE_17_DEPTH, mode=Mode.SUBTRACT)


solid = part.part
